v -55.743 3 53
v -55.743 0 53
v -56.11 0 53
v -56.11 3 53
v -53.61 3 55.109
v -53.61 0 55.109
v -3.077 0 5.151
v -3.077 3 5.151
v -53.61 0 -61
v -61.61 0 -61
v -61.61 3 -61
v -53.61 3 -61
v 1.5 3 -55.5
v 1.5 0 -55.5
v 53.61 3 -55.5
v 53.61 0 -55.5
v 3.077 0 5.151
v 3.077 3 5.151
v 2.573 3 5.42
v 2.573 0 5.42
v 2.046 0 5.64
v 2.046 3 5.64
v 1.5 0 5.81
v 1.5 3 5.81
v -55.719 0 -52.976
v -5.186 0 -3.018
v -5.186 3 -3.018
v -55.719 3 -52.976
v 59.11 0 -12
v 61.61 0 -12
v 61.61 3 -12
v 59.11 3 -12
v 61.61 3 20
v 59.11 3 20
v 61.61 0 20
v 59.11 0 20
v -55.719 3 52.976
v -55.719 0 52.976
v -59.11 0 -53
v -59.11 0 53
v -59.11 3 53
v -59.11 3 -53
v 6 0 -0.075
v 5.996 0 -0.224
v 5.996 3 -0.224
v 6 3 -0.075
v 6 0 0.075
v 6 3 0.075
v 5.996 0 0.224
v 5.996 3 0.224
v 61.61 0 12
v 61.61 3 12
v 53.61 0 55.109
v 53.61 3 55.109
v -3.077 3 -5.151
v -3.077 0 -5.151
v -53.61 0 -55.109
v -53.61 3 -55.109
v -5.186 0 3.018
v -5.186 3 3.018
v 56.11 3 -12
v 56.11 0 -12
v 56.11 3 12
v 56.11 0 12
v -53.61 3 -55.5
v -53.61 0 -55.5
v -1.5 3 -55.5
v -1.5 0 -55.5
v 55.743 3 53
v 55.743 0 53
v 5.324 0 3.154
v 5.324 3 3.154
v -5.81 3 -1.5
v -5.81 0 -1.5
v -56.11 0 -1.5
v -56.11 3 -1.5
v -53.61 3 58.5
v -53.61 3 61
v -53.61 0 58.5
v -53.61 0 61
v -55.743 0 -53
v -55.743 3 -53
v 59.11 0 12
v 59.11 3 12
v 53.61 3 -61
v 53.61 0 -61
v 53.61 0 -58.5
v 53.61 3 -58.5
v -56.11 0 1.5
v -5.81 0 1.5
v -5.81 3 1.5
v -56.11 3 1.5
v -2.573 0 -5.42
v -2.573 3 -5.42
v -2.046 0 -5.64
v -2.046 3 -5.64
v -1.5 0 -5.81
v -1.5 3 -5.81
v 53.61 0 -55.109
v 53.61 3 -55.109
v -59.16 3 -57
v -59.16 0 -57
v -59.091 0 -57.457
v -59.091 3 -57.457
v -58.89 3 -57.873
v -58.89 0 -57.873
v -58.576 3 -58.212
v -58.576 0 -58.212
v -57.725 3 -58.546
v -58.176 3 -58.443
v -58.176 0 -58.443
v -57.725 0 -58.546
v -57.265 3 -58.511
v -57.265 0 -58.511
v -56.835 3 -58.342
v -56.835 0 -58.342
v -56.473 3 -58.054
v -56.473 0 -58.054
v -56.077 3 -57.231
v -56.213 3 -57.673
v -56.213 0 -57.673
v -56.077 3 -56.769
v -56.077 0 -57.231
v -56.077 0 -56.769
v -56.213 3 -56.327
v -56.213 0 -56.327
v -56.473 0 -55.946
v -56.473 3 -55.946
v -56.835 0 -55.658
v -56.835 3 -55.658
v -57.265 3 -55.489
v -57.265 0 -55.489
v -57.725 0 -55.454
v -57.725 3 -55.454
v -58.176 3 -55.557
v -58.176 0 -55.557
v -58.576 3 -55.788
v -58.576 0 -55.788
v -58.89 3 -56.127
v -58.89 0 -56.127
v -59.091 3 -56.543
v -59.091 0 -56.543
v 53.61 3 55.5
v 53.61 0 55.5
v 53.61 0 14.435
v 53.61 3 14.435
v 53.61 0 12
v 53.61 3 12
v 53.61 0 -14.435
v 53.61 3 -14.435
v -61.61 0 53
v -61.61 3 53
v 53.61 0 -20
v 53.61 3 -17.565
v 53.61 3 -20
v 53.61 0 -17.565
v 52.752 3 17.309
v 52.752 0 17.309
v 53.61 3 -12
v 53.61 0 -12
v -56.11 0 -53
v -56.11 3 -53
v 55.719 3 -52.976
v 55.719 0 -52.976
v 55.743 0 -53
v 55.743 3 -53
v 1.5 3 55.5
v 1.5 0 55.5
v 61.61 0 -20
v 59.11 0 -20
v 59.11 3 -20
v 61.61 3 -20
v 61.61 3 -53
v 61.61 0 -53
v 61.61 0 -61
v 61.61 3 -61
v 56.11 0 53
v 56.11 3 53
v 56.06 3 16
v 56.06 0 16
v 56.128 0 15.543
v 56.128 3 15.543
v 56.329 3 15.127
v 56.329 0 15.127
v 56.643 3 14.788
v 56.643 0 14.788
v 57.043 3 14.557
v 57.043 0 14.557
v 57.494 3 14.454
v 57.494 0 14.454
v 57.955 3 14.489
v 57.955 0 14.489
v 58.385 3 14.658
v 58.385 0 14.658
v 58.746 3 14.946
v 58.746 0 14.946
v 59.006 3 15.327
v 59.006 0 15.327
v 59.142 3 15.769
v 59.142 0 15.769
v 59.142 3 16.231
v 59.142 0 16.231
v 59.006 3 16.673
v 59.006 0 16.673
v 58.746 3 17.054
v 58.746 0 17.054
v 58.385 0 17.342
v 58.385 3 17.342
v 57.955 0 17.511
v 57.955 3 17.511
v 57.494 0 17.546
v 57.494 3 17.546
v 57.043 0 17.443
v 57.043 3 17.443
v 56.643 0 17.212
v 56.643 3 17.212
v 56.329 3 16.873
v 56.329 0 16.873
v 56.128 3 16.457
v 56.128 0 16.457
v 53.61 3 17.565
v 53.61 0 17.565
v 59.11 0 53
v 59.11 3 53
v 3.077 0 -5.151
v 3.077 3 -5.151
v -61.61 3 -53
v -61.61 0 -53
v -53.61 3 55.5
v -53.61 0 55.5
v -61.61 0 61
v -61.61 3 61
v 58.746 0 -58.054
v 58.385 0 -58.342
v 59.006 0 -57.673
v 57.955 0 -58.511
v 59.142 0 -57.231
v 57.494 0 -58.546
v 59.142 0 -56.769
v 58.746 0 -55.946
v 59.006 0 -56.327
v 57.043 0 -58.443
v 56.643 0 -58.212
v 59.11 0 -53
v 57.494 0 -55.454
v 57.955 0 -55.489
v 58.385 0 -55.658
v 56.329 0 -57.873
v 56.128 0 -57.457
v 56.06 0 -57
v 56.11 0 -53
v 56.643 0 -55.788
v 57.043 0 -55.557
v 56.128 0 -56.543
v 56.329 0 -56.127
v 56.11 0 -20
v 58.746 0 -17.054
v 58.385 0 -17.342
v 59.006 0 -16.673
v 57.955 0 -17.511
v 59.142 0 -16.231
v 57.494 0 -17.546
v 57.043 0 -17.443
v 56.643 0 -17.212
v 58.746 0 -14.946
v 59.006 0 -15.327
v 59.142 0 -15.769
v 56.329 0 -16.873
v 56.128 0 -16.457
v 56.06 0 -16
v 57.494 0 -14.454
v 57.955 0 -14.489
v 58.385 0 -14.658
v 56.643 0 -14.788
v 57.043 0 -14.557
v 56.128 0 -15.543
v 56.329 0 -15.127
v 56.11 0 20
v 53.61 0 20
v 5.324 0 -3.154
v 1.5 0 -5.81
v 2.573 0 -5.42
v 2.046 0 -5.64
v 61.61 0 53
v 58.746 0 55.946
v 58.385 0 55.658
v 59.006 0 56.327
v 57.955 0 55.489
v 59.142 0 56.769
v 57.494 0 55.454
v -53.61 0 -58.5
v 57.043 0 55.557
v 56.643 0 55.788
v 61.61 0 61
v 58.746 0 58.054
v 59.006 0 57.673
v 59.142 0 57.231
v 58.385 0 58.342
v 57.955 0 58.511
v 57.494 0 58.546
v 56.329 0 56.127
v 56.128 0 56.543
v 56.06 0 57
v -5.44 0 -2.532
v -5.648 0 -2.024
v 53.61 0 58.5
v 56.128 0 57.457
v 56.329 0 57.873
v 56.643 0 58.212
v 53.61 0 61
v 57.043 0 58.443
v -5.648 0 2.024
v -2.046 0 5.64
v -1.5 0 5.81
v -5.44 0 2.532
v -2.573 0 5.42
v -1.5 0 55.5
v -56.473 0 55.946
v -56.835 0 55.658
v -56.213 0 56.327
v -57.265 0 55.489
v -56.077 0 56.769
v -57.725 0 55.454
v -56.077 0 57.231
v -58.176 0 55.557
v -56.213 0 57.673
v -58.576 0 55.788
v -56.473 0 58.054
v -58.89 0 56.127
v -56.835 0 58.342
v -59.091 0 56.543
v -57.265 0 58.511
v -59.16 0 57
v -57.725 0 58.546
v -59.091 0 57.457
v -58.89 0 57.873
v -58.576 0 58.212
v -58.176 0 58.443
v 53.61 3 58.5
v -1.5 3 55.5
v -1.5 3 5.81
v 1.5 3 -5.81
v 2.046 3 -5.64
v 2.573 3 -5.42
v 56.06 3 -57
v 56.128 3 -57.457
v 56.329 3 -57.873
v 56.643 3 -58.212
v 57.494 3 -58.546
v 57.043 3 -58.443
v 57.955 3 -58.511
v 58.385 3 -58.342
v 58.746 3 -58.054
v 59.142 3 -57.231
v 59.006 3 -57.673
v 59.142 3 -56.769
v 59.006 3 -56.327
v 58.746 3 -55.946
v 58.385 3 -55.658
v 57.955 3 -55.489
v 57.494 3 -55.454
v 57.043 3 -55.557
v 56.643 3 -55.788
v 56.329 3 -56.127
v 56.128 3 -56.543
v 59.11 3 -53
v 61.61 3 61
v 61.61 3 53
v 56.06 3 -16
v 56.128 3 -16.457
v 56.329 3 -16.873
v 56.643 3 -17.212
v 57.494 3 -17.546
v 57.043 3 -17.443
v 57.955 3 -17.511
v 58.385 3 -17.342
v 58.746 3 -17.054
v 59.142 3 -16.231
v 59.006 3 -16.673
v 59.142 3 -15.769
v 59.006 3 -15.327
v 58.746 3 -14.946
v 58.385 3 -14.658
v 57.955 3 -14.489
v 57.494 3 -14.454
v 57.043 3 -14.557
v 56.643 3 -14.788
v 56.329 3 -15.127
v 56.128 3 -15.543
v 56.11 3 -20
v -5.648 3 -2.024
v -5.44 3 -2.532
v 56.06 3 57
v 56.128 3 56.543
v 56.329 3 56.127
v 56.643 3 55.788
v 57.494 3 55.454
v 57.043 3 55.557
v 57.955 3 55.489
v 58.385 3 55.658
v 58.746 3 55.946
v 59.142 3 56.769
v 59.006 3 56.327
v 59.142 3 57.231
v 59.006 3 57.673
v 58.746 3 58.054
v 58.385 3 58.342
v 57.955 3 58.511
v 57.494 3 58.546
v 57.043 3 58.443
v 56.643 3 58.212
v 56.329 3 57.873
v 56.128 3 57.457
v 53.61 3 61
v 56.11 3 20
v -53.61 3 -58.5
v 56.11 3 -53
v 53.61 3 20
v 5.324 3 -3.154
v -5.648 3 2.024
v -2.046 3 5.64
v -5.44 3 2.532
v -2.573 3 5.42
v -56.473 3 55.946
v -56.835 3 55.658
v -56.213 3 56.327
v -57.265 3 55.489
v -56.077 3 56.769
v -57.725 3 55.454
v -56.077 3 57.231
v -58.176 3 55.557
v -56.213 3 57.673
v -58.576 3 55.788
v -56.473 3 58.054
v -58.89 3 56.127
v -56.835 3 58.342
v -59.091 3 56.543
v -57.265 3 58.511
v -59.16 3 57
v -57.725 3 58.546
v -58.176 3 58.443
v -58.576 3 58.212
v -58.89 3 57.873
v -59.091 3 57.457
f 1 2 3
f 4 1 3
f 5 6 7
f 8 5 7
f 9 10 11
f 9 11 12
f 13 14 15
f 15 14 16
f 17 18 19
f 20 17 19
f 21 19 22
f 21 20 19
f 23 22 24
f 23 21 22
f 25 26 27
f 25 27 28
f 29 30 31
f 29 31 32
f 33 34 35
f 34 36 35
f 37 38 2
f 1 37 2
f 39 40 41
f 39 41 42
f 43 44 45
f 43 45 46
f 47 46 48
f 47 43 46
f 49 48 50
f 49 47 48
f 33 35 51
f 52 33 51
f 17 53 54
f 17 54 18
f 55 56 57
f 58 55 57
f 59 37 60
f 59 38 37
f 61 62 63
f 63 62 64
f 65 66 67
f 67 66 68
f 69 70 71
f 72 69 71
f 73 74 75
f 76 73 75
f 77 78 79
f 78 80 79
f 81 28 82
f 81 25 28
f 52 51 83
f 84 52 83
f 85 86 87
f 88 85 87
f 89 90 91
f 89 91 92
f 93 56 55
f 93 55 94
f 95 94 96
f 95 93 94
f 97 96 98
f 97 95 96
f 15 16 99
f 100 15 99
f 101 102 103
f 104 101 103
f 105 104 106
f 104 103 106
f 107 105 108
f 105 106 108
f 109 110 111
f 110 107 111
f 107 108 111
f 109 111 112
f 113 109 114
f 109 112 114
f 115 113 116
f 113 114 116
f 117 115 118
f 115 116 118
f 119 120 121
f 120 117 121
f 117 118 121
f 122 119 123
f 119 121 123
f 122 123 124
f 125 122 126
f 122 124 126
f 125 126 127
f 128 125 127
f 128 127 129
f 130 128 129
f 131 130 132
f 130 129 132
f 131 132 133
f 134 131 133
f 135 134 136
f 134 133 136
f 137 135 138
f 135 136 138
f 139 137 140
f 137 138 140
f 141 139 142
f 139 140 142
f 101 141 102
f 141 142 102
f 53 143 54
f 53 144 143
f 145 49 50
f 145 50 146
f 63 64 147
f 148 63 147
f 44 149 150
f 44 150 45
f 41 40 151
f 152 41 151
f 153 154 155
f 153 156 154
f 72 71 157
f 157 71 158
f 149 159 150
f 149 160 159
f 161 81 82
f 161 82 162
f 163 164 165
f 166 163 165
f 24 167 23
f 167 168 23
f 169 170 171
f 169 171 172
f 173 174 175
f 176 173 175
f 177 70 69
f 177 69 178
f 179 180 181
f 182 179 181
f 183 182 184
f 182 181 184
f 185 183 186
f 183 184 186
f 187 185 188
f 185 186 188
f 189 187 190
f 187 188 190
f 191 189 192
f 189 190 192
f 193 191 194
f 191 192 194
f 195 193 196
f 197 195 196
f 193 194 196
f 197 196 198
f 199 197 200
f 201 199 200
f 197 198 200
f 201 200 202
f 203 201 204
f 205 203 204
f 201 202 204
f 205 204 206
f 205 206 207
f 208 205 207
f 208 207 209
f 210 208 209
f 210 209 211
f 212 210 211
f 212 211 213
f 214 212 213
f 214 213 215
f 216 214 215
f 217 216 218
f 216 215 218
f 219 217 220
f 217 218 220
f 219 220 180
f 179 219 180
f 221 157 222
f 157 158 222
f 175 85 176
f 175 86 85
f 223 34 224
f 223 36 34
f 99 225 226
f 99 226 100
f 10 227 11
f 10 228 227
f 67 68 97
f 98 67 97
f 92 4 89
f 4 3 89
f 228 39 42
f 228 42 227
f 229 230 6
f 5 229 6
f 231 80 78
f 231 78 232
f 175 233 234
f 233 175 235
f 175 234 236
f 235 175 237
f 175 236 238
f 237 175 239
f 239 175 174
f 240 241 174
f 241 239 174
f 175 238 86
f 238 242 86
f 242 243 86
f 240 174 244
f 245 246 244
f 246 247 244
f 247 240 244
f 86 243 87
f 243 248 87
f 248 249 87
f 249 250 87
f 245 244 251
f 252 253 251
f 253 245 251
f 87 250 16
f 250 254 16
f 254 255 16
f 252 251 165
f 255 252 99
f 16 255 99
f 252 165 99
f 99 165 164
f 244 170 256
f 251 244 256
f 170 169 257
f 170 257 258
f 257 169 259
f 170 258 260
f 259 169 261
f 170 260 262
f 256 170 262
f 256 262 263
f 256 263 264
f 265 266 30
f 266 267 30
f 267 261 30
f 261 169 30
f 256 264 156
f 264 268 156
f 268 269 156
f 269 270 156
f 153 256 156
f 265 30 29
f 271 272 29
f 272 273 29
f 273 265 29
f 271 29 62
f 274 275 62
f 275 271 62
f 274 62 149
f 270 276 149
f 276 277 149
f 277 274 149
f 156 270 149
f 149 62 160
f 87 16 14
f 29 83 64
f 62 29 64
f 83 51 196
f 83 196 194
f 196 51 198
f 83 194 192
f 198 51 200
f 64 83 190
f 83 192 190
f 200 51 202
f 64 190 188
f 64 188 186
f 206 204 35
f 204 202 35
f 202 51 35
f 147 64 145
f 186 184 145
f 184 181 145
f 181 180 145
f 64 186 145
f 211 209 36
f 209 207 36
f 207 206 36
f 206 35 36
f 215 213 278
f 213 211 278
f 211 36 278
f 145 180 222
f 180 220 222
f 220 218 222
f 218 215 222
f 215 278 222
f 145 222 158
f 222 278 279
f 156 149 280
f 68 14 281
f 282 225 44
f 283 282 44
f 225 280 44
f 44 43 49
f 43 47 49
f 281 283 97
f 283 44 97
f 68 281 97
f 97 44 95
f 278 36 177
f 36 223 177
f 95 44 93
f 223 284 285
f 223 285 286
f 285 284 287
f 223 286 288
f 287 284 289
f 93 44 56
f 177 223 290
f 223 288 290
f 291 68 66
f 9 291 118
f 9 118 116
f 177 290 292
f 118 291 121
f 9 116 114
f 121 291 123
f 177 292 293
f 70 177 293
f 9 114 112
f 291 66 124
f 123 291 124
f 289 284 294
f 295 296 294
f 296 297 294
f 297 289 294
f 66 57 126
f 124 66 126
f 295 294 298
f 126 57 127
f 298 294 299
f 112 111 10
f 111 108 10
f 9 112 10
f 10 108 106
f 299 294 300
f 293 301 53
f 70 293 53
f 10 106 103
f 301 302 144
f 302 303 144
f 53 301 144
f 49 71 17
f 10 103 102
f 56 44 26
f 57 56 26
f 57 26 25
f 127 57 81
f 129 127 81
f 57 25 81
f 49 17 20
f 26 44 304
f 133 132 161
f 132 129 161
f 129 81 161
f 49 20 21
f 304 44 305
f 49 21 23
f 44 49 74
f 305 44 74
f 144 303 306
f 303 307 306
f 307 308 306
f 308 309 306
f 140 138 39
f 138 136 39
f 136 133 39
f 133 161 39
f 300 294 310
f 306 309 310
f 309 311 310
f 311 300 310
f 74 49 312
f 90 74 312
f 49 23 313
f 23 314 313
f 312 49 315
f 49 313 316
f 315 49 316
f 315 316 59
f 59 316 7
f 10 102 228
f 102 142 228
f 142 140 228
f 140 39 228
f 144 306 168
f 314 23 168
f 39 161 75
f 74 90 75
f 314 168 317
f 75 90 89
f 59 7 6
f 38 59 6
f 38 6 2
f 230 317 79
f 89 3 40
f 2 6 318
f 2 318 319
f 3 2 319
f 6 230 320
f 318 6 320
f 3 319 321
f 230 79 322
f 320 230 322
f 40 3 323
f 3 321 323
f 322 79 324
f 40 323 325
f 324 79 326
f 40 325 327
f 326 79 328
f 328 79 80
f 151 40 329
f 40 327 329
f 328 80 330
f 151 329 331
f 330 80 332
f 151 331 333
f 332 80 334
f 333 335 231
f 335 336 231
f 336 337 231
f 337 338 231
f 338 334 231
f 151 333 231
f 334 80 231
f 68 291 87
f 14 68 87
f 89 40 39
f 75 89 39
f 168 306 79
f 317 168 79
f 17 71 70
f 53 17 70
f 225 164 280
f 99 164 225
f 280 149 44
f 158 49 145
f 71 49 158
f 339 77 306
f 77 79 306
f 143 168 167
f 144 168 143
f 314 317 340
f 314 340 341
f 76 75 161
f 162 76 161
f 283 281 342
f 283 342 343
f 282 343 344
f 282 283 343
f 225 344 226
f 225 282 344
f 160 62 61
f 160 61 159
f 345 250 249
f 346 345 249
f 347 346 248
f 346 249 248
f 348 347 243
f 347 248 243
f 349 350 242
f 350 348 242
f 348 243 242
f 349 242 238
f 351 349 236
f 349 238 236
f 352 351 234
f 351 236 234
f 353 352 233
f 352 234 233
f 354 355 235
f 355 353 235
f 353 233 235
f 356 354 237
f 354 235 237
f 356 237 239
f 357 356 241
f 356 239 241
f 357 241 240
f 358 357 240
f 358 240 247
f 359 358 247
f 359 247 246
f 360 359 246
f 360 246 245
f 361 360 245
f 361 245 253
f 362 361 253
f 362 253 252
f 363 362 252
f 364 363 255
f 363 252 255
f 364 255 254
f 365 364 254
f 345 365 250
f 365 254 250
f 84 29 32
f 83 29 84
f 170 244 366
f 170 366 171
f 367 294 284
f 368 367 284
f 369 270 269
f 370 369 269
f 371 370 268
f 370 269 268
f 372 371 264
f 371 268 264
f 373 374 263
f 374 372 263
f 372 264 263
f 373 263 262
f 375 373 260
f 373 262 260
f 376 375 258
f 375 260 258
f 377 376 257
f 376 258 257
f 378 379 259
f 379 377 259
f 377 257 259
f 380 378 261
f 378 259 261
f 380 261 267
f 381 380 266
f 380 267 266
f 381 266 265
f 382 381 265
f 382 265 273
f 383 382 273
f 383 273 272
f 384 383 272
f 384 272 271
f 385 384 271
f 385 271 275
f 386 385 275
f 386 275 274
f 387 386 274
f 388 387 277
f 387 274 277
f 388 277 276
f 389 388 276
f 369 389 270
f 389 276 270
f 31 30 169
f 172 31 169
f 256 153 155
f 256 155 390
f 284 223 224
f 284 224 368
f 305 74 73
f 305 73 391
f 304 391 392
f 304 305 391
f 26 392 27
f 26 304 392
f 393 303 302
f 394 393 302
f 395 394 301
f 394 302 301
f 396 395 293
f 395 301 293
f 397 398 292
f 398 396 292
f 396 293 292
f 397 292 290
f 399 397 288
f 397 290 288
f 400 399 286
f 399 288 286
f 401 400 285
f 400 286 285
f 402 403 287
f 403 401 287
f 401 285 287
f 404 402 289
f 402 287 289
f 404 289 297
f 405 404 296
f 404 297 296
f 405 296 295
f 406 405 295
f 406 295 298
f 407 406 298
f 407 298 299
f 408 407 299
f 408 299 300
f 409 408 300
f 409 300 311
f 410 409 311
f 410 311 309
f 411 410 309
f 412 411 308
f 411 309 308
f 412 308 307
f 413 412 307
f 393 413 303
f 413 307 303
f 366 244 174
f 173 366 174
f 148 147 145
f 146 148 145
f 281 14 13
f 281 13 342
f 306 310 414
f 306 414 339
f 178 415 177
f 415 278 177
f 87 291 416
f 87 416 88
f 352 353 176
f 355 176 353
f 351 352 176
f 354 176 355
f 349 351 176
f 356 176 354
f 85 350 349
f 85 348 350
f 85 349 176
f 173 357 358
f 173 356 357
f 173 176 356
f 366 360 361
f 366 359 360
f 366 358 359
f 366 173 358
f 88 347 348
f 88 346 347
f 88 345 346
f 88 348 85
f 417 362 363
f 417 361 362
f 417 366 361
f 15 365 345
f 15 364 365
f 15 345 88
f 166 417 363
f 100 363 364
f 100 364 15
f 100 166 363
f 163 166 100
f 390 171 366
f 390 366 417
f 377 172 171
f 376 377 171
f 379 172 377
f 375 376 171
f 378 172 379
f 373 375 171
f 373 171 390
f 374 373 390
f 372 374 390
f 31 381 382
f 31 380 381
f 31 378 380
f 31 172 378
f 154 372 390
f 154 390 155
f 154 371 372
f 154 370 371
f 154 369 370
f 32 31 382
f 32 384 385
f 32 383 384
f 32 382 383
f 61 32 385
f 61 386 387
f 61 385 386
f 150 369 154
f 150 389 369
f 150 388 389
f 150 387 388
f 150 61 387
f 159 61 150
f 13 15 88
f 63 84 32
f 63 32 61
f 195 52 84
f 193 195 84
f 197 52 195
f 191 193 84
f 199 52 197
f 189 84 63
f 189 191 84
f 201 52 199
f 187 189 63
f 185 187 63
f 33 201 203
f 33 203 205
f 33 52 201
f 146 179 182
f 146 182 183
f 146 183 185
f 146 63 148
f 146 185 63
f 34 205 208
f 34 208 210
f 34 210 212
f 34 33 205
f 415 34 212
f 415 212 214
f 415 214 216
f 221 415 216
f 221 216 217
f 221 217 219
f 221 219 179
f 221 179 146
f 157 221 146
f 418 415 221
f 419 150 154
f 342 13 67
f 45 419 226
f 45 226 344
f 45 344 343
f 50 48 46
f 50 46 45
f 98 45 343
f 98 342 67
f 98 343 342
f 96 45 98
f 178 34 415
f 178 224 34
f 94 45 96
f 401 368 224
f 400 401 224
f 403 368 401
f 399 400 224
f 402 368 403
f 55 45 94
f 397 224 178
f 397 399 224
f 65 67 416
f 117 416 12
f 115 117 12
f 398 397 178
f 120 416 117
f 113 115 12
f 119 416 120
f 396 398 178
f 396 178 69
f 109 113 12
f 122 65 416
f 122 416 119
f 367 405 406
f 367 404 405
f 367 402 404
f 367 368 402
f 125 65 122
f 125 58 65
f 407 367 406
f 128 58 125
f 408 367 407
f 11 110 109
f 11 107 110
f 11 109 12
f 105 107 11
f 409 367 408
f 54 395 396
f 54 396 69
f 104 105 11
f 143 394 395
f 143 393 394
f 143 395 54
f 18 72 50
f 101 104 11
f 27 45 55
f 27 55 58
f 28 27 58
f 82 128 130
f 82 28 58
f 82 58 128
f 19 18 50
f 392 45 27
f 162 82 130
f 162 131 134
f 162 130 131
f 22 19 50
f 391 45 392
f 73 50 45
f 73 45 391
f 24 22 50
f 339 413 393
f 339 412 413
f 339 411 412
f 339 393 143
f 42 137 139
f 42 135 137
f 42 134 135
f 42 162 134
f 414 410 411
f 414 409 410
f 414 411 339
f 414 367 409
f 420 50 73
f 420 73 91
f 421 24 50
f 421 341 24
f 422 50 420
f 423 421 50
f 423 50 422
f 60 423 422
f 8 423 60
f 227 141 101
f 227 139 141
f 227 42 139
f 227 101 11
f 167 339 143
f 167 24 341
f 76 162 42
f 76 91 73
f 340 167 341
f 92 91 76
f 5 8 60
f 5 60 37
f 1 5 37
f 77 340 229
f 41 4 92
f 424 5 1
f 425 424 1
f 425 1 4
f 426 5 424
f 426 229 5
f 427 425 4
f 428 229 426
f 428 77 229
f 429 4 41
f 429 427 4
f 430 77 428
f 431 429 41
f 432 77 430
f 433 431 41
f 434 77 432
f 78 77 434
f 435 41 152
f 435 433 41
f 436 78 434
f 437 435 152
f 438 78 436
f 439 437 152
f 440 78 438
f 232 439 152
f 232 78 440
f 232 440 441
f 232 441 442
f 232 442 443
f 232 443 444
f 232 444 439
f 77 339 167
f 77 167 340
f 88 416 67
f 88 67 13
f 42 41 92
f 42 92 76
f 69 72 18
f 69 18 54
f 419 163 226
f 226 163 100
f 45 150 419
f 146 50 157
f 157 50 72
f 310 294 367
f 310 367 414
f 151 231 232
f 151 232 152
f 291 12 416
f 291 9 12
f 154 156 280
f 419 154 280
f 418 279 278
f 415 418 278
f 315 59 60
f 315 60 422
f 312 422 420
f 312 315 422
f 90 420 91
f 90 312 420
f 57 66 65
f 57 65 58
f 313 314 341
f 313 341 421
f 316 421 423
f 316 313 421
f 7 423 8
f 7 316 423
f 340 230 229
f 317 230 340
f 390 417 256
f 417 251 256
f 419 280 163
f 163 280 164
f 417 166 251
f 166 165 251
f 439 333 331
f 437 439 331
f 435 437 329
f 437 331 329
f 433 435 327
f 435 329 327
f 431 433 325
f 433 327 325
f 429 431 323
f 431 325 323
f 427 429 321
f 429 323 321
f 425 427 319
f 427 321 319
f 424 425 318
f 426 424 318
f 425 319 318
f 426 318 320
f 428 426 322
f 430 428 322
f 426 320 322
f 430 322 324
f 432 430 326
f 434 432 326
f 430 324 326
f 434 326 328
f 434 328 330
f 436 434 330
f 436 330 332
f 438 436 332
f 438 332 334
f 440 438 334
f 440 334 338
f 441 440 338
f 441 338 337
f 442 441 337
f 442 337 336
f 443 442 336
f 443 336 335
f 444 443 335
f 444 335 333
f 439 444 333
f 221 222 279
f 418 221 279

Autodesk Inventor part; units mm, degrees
ref_plane "YZ Plane" through (0, 0, 0) normal (1, 0, 0) x (0, 1, 0)
ref_plane "XZ Plane" through (0, 0, 0) normal (0, 1, 0) x (-1, 0, 0)
ref_plane "XY Plane" through (0, 0, 0) normal (0, 0, 1) x (1, 0, 0)
sketch "Sketch1" plane through (0, 0, 0) normal (0, 1, 0) x (-1, 0, 0)
  line L0 (75, 65) -> (-75, 65)
  line L1 (-75, 65) -> (-75, -65)
  line L2 (-75, -65) -> (75, -65)
  line L3 (75, -65) -> (75, 65)
  line L4 (75, 65) -> (-75, -65) construction
  line L5 (-75, 65) -> (75, -65) construction
  line L6 (62.0096, 65) -> (62.0096, -65)
  line L7 (105, 0) -> (-105, 0) projected
  line L8 (0, -91) -> (0, 91) projected
  line L9 (-62.0096, 65) -> (-62.0096, -65)
  line L10 (61.6096, 65) -> (61.6096, -65)
  line L11 (-61.6096, 65) -> (-61.6096, -65)
  line L12 (-71, 61) -> (71, 61)
  line L13 (71, 61) -> (71, -61)
  line L14 (71, -61) -> (-71, -61)
  line L15 (-71, -61) -> (-71, 61)
  line L16 (61.6096, 61) -> (53.6096, 61)
  line L17 (53.6096, 61) -> (53.6096, 53)
  line L18 (53.6096, 53) -> (61.6096, 53)
  line L19 (61.6096, 53) -> (61.6096, 61)
  line L20 (61.6096, -61) -> (53.6096, -61)
  line L21 (53.6096, -61) -> (53.6096, -53)
  line L22 (53.6096, -53) -> (61.6096, -53)
  line L23 (-61.6096, 61) -> (-53.6096, 61)
  line L24 (-53.6096, 61) -> (-53.6096, 53)
  line L25 (-53.6096, 53) -> (-61.6096, 53)
  line L26 (-61.6096, 53) -> (-61.6096, 61)
  line L27 (-53.6096, -61) -> (-53.6096, -53)
  line L28 (-53.6096, -53) -> (-61.6096, -53)
  line L29 (-61.6096, -61) -> (-53.6096, -61)
  line L30 (-61.6096, 12) -> (-53.6096, 12)
  line L31 (-53.6096, 12) -> (-53.6096, 20)
  line L32 (-53.6096, 20) -> (-61.6096, 20)
  line L33 (-61.6096, 20) -> (-61.6096, 12)
  line L34 (-61.6096, -12) -> (-53.6096, -12)
  line L35 (-53.6096, -12) -> (-53.6096, -20)
  line L36 (-53.6096, -20) -> (-61.6096, -20)
  circle A0 centre (57.6096, 57) radius 1.55
  line L37 (61.6096, 57) -> (53.6096, 57)
  line L38 (57.6096, 61) -> (57.6096, 53)
  circle A1 centre (57.6096, -57) radius 1.55
  circle A2 centre (-57.6096, 57) radius 1.55
  circle A3 centre (-57.6096, -57) radius 1.55
  line L39 (-53.6096, 16) -> (-61.6096, 16)
  line L40 (-57.6096, 20) -> (-57.6096, 12)
  circle A4 centre (-57.6096, 16) radius 1.55
  circle A5 centre (-57.6096, -16) radius 1.55
  line L41 (53.6096, 57) -> (-53.6096, 57)
  line L42 (57.6096, 53) -> (57.6096, -53)
  line L43 (53.6096, -57) -> (-53.6096, -57)
  line L44 (-57.6096, -53) -> (-57.6096, -20)
  line L45 (-57.6096, -12) -> (-57.6096, 12)
  line L46 (-57.6096, 20) -> (-57.6096, 53)
  line L47 (53.6096, 53) -> (-53.6096, -53)
  line L48 (-53.6096, 53) -> (53.6096, -53)
  line L49 (0, 0) -> (57.6096, 0)
  line L50 (0, 0) -> (-57.6096, 0)
  line L51 (0, 0) -> (-53.6096, 16)
  line L52 (0, 0) -> (-53.6096, -16)
  circle A6 centre (0, 0) radius 6
  line L53 (53.6096, 55.1093) -> (3.0768, 5.1511)
  line L54 (53.6096, 58.5) -> (-53.6096, 58.5)
  line L55 (59.1096, 53) -> (59.1096, -53)
  line L56 (53.6096, -58.5) -> (-53.6096, -58.5)
  line L57 (-59.1096, -53) -> (-59.1096, -20)
  line L58 (-59.1096, -12) -> (-59.1096, 12)
  line L59 (-59.1096, 20) -> (-59.1096, 53)
  line L60 (-55.7432, 53) -> (-5.1859, 3.0177)
  line L61 (-5.9958, 0.2241) -> (-53.6096, 14.4346)
  line L62 (-53.6096, -17.5654) -> (-5.1378, -3.0988)
  line L63 (-3.0768, -5.1511) -> (-53.6096, -55.1093)
  line L64 (5.8095, -1.5) -> (57.6096, -1.5)
  line L65 (56.1096, 53) -> (56.1096, -53)
  line L66 (53.6096, 55.5) -> (-53.6096, 55.5)
  line L67 (55.7188, 52.9759) -> (5.1859, 3.0177)
  line L68 (5.8095, 1.5) -> (57.6096, 1.5)
  line L69 (-53.634, 55.1334) -> (-3.0768, 5.1511)
  line L70 (-5.1378, 3.0988) -> (-52.7517, 17.3093)
  line L71 (-5.1859, -3.0177) -> (-55.7188, -52.9759)
  line L72 (53.6096, -55.5) -> (-53.6096, -55.5)
  line L73 (-56.1096, -53) -> (-56.1096, -20)
  line L74 (-56.1096, -12) -> (-56.1096, 12)
  line L75 (-56.1096, 20) -> (-56.1096, 53)
  line L76 (-54.4676, -14.6907) -> (-5.9958, -0.2241)
  line L77 (3.0768, -5.1511) -> (53.6096, -55.1093)
  line L78 (5.1859, -3.0177) -> (55.7188, -52.9759)
  line L79 (1.5, 55.5) -> (1.5, 5.8095)
  line L80 (-1.5, 55.5) -> (-1.5, 5.8095)
  line L81 (1.5, -55.5) -> (1.5, -5.8095)
  line L82 (-1.5, -55.5) -> (-1.5, -5.8095)
  line L83 (-52.7517, 17.3093) -> (-53.6096, 17.5654)
  line L84 (55.7188, -52.9759) -> (55.7432, -53)
  line L85 (55.7188, 52.9759) -> (55.7432, 53)
  line L86 (-55.7188, -52.9759) -> (-55.7432, -53)
  point P0 (-61.6096, 61)
  point P1 (-61.6096, 0)
  point P2 (-71, 0)
  point P3 (4.2668, -4.2183)
  point P4 (56.1096, -1.5)
  point P5 (-4.2668, -4.2183)
  point P6 (-56.1096, -20)
  point P7 (1.5, -5.8095)
  point P8 (-1.5, -5.8095)
  point P9 (-1.5, 5.8095)
  point P10 (-3.0768, 5.1511)
  point P11 (-53.6096, 55.1093)
  point P12 (56.1096, 1.5)
  point P13 (4.2668, 4.2183)
  point P14 (-53.6096, -14.4346)
  point P15 (-5.7494, 1.7159)
  point P16 (-61.6096, -61)
  point P17 (61.6096, -61)
  point P18 (-5.3243, -3.1544)
  point P19 (5.1859, 3.0177)
  point P20 (-5.3243, 3.1544)
  dimension "d13" = 12
  dimension "d0" = 150
  dimension "d1" = 130
  dimension "d2" = 12.9904
  dimension "d3" = 0.4
  dimension "d4" = 4
  dimension "d5" = 8
  dimension "d6" = 8
  dimension "d7" = 8
  dimension "d8" = 8
  dimension "d9" = 12
  dimension "d10" = 3.1
  dimension "d11" = 3.1
  dimension "d14" = 3
  dimension "d15" = 3
  dimension "d16" = 3
  dimension "d17" = 3
  dimension "d18" = 3
  dimension "d19" = 3
  dimension "d20" = 3
  dimension "d21" = 3
  dimension "d22" = 3
  dimension "d23" = 3
  dimension "d24" = 3
  dimension "d25" = 3
extrude "Extrusion1" add sketch "Sketch1" along normal blind 3 contours L10 L37 A0 L38 L12 | L10 L18 L38 A0 L37 | L38 A0 L37 L17 L12 | L12 L24 L25 L11 | L54 L17 L41 L8 | L8 L41 L24 L54 | L14 L21 L22 L10 | L55 L22 L42 L7 | L7 L42 L18 L55 | L41 L17 L66 L8 | L8 L66 L24 L41 | L38 L18 L17 L37 A0 | L42 L64 L65 L7 | L7 L65 L68 L42 | L32 L40 A4 L39 L11 | L25 L46 L32 L59 | L66 L79 A6 L8 | L8 A6 L80 L66 | L42 L68 L65 L18 | L56 L8 L43 L21 | L65 L64 A6 L7 | L7 A6 L68 L65 | L42 L22 L65 L64 | L11 L28 L27 L14 | L56 L27 L43 L8 | L39 A4 L40 L30 L11 | L25 L75 L32 L46 | A6 L47 L8 | L8 L48 A6 | L43 L8 L72 L21 | A6 L48 L7 | L7 L47 A6 | L43 L27 L72 L8 | L58 L30 L45 L7 | L7 L45 L34 L58 | L34 L35 L36 L11 | L32 L31 L39 A4 L40 | L52 A6 L7 | L48 A6 L8 | L8 A6 L47 | L51 A6 L48 | L7 A6 L51 | L47 A6 L52 | L17 L47 A6 L53 | L69 A6 L48 L24 | L85 L67 A6 L47 L18 | L22 L48 A6 L78 L84 | L57 L36 L44 L28 | L72 L82 A6 L8 | L8 A6 L81 L72 | L45 L30 L74 L7 | L7 L74 L34 L45 | A4 L39 L31 L30 L40 | L25 L48 A6 L70 L60 | A6 L63 L27 L47 | L47 L28 L86 L71 L62 A6 | L48 L21 L77 A6 | A6 L61 L31 L51 | L51 L31 L83 L70 L60 A6 | A6 L71 L62 L35 L52 | L52 L35 L76 A6 | L44 L36 L73 L28 | L70 A6 L60 | L62 L71 A6
equation "\"d0\" = BodyLength"
equation "\"d1\" = BodyWidth"
equation "\"d2\" = 0.433013 * BodyHeight"
equation "\"d4\" = SideThickness"
equation "\"d5\" = M3ScrewInsertBrim"
equation "\"d6\" = M3ScrewInsertBrim"
equation "\"d7\" = M3ScrewInsertBrim"
equation "\"d8\" = M3ScrewInsertBrim"
equation "\"d10\" = M3ScrewDia"
equation "\"d11\" = M3ScrewDia"
equation "\"BodyLength\" = 150"
equation "\"BodyWidth\" = 130"
equation "\"BodyHeight\" = 30"
equation "\"SideThickness\" = 4"
equation "\"M3ScrewInsertBrim\" = 8"
equation "\"M3ScrewDia\" = 3.1"
properties part number "HexScrewGuide"
